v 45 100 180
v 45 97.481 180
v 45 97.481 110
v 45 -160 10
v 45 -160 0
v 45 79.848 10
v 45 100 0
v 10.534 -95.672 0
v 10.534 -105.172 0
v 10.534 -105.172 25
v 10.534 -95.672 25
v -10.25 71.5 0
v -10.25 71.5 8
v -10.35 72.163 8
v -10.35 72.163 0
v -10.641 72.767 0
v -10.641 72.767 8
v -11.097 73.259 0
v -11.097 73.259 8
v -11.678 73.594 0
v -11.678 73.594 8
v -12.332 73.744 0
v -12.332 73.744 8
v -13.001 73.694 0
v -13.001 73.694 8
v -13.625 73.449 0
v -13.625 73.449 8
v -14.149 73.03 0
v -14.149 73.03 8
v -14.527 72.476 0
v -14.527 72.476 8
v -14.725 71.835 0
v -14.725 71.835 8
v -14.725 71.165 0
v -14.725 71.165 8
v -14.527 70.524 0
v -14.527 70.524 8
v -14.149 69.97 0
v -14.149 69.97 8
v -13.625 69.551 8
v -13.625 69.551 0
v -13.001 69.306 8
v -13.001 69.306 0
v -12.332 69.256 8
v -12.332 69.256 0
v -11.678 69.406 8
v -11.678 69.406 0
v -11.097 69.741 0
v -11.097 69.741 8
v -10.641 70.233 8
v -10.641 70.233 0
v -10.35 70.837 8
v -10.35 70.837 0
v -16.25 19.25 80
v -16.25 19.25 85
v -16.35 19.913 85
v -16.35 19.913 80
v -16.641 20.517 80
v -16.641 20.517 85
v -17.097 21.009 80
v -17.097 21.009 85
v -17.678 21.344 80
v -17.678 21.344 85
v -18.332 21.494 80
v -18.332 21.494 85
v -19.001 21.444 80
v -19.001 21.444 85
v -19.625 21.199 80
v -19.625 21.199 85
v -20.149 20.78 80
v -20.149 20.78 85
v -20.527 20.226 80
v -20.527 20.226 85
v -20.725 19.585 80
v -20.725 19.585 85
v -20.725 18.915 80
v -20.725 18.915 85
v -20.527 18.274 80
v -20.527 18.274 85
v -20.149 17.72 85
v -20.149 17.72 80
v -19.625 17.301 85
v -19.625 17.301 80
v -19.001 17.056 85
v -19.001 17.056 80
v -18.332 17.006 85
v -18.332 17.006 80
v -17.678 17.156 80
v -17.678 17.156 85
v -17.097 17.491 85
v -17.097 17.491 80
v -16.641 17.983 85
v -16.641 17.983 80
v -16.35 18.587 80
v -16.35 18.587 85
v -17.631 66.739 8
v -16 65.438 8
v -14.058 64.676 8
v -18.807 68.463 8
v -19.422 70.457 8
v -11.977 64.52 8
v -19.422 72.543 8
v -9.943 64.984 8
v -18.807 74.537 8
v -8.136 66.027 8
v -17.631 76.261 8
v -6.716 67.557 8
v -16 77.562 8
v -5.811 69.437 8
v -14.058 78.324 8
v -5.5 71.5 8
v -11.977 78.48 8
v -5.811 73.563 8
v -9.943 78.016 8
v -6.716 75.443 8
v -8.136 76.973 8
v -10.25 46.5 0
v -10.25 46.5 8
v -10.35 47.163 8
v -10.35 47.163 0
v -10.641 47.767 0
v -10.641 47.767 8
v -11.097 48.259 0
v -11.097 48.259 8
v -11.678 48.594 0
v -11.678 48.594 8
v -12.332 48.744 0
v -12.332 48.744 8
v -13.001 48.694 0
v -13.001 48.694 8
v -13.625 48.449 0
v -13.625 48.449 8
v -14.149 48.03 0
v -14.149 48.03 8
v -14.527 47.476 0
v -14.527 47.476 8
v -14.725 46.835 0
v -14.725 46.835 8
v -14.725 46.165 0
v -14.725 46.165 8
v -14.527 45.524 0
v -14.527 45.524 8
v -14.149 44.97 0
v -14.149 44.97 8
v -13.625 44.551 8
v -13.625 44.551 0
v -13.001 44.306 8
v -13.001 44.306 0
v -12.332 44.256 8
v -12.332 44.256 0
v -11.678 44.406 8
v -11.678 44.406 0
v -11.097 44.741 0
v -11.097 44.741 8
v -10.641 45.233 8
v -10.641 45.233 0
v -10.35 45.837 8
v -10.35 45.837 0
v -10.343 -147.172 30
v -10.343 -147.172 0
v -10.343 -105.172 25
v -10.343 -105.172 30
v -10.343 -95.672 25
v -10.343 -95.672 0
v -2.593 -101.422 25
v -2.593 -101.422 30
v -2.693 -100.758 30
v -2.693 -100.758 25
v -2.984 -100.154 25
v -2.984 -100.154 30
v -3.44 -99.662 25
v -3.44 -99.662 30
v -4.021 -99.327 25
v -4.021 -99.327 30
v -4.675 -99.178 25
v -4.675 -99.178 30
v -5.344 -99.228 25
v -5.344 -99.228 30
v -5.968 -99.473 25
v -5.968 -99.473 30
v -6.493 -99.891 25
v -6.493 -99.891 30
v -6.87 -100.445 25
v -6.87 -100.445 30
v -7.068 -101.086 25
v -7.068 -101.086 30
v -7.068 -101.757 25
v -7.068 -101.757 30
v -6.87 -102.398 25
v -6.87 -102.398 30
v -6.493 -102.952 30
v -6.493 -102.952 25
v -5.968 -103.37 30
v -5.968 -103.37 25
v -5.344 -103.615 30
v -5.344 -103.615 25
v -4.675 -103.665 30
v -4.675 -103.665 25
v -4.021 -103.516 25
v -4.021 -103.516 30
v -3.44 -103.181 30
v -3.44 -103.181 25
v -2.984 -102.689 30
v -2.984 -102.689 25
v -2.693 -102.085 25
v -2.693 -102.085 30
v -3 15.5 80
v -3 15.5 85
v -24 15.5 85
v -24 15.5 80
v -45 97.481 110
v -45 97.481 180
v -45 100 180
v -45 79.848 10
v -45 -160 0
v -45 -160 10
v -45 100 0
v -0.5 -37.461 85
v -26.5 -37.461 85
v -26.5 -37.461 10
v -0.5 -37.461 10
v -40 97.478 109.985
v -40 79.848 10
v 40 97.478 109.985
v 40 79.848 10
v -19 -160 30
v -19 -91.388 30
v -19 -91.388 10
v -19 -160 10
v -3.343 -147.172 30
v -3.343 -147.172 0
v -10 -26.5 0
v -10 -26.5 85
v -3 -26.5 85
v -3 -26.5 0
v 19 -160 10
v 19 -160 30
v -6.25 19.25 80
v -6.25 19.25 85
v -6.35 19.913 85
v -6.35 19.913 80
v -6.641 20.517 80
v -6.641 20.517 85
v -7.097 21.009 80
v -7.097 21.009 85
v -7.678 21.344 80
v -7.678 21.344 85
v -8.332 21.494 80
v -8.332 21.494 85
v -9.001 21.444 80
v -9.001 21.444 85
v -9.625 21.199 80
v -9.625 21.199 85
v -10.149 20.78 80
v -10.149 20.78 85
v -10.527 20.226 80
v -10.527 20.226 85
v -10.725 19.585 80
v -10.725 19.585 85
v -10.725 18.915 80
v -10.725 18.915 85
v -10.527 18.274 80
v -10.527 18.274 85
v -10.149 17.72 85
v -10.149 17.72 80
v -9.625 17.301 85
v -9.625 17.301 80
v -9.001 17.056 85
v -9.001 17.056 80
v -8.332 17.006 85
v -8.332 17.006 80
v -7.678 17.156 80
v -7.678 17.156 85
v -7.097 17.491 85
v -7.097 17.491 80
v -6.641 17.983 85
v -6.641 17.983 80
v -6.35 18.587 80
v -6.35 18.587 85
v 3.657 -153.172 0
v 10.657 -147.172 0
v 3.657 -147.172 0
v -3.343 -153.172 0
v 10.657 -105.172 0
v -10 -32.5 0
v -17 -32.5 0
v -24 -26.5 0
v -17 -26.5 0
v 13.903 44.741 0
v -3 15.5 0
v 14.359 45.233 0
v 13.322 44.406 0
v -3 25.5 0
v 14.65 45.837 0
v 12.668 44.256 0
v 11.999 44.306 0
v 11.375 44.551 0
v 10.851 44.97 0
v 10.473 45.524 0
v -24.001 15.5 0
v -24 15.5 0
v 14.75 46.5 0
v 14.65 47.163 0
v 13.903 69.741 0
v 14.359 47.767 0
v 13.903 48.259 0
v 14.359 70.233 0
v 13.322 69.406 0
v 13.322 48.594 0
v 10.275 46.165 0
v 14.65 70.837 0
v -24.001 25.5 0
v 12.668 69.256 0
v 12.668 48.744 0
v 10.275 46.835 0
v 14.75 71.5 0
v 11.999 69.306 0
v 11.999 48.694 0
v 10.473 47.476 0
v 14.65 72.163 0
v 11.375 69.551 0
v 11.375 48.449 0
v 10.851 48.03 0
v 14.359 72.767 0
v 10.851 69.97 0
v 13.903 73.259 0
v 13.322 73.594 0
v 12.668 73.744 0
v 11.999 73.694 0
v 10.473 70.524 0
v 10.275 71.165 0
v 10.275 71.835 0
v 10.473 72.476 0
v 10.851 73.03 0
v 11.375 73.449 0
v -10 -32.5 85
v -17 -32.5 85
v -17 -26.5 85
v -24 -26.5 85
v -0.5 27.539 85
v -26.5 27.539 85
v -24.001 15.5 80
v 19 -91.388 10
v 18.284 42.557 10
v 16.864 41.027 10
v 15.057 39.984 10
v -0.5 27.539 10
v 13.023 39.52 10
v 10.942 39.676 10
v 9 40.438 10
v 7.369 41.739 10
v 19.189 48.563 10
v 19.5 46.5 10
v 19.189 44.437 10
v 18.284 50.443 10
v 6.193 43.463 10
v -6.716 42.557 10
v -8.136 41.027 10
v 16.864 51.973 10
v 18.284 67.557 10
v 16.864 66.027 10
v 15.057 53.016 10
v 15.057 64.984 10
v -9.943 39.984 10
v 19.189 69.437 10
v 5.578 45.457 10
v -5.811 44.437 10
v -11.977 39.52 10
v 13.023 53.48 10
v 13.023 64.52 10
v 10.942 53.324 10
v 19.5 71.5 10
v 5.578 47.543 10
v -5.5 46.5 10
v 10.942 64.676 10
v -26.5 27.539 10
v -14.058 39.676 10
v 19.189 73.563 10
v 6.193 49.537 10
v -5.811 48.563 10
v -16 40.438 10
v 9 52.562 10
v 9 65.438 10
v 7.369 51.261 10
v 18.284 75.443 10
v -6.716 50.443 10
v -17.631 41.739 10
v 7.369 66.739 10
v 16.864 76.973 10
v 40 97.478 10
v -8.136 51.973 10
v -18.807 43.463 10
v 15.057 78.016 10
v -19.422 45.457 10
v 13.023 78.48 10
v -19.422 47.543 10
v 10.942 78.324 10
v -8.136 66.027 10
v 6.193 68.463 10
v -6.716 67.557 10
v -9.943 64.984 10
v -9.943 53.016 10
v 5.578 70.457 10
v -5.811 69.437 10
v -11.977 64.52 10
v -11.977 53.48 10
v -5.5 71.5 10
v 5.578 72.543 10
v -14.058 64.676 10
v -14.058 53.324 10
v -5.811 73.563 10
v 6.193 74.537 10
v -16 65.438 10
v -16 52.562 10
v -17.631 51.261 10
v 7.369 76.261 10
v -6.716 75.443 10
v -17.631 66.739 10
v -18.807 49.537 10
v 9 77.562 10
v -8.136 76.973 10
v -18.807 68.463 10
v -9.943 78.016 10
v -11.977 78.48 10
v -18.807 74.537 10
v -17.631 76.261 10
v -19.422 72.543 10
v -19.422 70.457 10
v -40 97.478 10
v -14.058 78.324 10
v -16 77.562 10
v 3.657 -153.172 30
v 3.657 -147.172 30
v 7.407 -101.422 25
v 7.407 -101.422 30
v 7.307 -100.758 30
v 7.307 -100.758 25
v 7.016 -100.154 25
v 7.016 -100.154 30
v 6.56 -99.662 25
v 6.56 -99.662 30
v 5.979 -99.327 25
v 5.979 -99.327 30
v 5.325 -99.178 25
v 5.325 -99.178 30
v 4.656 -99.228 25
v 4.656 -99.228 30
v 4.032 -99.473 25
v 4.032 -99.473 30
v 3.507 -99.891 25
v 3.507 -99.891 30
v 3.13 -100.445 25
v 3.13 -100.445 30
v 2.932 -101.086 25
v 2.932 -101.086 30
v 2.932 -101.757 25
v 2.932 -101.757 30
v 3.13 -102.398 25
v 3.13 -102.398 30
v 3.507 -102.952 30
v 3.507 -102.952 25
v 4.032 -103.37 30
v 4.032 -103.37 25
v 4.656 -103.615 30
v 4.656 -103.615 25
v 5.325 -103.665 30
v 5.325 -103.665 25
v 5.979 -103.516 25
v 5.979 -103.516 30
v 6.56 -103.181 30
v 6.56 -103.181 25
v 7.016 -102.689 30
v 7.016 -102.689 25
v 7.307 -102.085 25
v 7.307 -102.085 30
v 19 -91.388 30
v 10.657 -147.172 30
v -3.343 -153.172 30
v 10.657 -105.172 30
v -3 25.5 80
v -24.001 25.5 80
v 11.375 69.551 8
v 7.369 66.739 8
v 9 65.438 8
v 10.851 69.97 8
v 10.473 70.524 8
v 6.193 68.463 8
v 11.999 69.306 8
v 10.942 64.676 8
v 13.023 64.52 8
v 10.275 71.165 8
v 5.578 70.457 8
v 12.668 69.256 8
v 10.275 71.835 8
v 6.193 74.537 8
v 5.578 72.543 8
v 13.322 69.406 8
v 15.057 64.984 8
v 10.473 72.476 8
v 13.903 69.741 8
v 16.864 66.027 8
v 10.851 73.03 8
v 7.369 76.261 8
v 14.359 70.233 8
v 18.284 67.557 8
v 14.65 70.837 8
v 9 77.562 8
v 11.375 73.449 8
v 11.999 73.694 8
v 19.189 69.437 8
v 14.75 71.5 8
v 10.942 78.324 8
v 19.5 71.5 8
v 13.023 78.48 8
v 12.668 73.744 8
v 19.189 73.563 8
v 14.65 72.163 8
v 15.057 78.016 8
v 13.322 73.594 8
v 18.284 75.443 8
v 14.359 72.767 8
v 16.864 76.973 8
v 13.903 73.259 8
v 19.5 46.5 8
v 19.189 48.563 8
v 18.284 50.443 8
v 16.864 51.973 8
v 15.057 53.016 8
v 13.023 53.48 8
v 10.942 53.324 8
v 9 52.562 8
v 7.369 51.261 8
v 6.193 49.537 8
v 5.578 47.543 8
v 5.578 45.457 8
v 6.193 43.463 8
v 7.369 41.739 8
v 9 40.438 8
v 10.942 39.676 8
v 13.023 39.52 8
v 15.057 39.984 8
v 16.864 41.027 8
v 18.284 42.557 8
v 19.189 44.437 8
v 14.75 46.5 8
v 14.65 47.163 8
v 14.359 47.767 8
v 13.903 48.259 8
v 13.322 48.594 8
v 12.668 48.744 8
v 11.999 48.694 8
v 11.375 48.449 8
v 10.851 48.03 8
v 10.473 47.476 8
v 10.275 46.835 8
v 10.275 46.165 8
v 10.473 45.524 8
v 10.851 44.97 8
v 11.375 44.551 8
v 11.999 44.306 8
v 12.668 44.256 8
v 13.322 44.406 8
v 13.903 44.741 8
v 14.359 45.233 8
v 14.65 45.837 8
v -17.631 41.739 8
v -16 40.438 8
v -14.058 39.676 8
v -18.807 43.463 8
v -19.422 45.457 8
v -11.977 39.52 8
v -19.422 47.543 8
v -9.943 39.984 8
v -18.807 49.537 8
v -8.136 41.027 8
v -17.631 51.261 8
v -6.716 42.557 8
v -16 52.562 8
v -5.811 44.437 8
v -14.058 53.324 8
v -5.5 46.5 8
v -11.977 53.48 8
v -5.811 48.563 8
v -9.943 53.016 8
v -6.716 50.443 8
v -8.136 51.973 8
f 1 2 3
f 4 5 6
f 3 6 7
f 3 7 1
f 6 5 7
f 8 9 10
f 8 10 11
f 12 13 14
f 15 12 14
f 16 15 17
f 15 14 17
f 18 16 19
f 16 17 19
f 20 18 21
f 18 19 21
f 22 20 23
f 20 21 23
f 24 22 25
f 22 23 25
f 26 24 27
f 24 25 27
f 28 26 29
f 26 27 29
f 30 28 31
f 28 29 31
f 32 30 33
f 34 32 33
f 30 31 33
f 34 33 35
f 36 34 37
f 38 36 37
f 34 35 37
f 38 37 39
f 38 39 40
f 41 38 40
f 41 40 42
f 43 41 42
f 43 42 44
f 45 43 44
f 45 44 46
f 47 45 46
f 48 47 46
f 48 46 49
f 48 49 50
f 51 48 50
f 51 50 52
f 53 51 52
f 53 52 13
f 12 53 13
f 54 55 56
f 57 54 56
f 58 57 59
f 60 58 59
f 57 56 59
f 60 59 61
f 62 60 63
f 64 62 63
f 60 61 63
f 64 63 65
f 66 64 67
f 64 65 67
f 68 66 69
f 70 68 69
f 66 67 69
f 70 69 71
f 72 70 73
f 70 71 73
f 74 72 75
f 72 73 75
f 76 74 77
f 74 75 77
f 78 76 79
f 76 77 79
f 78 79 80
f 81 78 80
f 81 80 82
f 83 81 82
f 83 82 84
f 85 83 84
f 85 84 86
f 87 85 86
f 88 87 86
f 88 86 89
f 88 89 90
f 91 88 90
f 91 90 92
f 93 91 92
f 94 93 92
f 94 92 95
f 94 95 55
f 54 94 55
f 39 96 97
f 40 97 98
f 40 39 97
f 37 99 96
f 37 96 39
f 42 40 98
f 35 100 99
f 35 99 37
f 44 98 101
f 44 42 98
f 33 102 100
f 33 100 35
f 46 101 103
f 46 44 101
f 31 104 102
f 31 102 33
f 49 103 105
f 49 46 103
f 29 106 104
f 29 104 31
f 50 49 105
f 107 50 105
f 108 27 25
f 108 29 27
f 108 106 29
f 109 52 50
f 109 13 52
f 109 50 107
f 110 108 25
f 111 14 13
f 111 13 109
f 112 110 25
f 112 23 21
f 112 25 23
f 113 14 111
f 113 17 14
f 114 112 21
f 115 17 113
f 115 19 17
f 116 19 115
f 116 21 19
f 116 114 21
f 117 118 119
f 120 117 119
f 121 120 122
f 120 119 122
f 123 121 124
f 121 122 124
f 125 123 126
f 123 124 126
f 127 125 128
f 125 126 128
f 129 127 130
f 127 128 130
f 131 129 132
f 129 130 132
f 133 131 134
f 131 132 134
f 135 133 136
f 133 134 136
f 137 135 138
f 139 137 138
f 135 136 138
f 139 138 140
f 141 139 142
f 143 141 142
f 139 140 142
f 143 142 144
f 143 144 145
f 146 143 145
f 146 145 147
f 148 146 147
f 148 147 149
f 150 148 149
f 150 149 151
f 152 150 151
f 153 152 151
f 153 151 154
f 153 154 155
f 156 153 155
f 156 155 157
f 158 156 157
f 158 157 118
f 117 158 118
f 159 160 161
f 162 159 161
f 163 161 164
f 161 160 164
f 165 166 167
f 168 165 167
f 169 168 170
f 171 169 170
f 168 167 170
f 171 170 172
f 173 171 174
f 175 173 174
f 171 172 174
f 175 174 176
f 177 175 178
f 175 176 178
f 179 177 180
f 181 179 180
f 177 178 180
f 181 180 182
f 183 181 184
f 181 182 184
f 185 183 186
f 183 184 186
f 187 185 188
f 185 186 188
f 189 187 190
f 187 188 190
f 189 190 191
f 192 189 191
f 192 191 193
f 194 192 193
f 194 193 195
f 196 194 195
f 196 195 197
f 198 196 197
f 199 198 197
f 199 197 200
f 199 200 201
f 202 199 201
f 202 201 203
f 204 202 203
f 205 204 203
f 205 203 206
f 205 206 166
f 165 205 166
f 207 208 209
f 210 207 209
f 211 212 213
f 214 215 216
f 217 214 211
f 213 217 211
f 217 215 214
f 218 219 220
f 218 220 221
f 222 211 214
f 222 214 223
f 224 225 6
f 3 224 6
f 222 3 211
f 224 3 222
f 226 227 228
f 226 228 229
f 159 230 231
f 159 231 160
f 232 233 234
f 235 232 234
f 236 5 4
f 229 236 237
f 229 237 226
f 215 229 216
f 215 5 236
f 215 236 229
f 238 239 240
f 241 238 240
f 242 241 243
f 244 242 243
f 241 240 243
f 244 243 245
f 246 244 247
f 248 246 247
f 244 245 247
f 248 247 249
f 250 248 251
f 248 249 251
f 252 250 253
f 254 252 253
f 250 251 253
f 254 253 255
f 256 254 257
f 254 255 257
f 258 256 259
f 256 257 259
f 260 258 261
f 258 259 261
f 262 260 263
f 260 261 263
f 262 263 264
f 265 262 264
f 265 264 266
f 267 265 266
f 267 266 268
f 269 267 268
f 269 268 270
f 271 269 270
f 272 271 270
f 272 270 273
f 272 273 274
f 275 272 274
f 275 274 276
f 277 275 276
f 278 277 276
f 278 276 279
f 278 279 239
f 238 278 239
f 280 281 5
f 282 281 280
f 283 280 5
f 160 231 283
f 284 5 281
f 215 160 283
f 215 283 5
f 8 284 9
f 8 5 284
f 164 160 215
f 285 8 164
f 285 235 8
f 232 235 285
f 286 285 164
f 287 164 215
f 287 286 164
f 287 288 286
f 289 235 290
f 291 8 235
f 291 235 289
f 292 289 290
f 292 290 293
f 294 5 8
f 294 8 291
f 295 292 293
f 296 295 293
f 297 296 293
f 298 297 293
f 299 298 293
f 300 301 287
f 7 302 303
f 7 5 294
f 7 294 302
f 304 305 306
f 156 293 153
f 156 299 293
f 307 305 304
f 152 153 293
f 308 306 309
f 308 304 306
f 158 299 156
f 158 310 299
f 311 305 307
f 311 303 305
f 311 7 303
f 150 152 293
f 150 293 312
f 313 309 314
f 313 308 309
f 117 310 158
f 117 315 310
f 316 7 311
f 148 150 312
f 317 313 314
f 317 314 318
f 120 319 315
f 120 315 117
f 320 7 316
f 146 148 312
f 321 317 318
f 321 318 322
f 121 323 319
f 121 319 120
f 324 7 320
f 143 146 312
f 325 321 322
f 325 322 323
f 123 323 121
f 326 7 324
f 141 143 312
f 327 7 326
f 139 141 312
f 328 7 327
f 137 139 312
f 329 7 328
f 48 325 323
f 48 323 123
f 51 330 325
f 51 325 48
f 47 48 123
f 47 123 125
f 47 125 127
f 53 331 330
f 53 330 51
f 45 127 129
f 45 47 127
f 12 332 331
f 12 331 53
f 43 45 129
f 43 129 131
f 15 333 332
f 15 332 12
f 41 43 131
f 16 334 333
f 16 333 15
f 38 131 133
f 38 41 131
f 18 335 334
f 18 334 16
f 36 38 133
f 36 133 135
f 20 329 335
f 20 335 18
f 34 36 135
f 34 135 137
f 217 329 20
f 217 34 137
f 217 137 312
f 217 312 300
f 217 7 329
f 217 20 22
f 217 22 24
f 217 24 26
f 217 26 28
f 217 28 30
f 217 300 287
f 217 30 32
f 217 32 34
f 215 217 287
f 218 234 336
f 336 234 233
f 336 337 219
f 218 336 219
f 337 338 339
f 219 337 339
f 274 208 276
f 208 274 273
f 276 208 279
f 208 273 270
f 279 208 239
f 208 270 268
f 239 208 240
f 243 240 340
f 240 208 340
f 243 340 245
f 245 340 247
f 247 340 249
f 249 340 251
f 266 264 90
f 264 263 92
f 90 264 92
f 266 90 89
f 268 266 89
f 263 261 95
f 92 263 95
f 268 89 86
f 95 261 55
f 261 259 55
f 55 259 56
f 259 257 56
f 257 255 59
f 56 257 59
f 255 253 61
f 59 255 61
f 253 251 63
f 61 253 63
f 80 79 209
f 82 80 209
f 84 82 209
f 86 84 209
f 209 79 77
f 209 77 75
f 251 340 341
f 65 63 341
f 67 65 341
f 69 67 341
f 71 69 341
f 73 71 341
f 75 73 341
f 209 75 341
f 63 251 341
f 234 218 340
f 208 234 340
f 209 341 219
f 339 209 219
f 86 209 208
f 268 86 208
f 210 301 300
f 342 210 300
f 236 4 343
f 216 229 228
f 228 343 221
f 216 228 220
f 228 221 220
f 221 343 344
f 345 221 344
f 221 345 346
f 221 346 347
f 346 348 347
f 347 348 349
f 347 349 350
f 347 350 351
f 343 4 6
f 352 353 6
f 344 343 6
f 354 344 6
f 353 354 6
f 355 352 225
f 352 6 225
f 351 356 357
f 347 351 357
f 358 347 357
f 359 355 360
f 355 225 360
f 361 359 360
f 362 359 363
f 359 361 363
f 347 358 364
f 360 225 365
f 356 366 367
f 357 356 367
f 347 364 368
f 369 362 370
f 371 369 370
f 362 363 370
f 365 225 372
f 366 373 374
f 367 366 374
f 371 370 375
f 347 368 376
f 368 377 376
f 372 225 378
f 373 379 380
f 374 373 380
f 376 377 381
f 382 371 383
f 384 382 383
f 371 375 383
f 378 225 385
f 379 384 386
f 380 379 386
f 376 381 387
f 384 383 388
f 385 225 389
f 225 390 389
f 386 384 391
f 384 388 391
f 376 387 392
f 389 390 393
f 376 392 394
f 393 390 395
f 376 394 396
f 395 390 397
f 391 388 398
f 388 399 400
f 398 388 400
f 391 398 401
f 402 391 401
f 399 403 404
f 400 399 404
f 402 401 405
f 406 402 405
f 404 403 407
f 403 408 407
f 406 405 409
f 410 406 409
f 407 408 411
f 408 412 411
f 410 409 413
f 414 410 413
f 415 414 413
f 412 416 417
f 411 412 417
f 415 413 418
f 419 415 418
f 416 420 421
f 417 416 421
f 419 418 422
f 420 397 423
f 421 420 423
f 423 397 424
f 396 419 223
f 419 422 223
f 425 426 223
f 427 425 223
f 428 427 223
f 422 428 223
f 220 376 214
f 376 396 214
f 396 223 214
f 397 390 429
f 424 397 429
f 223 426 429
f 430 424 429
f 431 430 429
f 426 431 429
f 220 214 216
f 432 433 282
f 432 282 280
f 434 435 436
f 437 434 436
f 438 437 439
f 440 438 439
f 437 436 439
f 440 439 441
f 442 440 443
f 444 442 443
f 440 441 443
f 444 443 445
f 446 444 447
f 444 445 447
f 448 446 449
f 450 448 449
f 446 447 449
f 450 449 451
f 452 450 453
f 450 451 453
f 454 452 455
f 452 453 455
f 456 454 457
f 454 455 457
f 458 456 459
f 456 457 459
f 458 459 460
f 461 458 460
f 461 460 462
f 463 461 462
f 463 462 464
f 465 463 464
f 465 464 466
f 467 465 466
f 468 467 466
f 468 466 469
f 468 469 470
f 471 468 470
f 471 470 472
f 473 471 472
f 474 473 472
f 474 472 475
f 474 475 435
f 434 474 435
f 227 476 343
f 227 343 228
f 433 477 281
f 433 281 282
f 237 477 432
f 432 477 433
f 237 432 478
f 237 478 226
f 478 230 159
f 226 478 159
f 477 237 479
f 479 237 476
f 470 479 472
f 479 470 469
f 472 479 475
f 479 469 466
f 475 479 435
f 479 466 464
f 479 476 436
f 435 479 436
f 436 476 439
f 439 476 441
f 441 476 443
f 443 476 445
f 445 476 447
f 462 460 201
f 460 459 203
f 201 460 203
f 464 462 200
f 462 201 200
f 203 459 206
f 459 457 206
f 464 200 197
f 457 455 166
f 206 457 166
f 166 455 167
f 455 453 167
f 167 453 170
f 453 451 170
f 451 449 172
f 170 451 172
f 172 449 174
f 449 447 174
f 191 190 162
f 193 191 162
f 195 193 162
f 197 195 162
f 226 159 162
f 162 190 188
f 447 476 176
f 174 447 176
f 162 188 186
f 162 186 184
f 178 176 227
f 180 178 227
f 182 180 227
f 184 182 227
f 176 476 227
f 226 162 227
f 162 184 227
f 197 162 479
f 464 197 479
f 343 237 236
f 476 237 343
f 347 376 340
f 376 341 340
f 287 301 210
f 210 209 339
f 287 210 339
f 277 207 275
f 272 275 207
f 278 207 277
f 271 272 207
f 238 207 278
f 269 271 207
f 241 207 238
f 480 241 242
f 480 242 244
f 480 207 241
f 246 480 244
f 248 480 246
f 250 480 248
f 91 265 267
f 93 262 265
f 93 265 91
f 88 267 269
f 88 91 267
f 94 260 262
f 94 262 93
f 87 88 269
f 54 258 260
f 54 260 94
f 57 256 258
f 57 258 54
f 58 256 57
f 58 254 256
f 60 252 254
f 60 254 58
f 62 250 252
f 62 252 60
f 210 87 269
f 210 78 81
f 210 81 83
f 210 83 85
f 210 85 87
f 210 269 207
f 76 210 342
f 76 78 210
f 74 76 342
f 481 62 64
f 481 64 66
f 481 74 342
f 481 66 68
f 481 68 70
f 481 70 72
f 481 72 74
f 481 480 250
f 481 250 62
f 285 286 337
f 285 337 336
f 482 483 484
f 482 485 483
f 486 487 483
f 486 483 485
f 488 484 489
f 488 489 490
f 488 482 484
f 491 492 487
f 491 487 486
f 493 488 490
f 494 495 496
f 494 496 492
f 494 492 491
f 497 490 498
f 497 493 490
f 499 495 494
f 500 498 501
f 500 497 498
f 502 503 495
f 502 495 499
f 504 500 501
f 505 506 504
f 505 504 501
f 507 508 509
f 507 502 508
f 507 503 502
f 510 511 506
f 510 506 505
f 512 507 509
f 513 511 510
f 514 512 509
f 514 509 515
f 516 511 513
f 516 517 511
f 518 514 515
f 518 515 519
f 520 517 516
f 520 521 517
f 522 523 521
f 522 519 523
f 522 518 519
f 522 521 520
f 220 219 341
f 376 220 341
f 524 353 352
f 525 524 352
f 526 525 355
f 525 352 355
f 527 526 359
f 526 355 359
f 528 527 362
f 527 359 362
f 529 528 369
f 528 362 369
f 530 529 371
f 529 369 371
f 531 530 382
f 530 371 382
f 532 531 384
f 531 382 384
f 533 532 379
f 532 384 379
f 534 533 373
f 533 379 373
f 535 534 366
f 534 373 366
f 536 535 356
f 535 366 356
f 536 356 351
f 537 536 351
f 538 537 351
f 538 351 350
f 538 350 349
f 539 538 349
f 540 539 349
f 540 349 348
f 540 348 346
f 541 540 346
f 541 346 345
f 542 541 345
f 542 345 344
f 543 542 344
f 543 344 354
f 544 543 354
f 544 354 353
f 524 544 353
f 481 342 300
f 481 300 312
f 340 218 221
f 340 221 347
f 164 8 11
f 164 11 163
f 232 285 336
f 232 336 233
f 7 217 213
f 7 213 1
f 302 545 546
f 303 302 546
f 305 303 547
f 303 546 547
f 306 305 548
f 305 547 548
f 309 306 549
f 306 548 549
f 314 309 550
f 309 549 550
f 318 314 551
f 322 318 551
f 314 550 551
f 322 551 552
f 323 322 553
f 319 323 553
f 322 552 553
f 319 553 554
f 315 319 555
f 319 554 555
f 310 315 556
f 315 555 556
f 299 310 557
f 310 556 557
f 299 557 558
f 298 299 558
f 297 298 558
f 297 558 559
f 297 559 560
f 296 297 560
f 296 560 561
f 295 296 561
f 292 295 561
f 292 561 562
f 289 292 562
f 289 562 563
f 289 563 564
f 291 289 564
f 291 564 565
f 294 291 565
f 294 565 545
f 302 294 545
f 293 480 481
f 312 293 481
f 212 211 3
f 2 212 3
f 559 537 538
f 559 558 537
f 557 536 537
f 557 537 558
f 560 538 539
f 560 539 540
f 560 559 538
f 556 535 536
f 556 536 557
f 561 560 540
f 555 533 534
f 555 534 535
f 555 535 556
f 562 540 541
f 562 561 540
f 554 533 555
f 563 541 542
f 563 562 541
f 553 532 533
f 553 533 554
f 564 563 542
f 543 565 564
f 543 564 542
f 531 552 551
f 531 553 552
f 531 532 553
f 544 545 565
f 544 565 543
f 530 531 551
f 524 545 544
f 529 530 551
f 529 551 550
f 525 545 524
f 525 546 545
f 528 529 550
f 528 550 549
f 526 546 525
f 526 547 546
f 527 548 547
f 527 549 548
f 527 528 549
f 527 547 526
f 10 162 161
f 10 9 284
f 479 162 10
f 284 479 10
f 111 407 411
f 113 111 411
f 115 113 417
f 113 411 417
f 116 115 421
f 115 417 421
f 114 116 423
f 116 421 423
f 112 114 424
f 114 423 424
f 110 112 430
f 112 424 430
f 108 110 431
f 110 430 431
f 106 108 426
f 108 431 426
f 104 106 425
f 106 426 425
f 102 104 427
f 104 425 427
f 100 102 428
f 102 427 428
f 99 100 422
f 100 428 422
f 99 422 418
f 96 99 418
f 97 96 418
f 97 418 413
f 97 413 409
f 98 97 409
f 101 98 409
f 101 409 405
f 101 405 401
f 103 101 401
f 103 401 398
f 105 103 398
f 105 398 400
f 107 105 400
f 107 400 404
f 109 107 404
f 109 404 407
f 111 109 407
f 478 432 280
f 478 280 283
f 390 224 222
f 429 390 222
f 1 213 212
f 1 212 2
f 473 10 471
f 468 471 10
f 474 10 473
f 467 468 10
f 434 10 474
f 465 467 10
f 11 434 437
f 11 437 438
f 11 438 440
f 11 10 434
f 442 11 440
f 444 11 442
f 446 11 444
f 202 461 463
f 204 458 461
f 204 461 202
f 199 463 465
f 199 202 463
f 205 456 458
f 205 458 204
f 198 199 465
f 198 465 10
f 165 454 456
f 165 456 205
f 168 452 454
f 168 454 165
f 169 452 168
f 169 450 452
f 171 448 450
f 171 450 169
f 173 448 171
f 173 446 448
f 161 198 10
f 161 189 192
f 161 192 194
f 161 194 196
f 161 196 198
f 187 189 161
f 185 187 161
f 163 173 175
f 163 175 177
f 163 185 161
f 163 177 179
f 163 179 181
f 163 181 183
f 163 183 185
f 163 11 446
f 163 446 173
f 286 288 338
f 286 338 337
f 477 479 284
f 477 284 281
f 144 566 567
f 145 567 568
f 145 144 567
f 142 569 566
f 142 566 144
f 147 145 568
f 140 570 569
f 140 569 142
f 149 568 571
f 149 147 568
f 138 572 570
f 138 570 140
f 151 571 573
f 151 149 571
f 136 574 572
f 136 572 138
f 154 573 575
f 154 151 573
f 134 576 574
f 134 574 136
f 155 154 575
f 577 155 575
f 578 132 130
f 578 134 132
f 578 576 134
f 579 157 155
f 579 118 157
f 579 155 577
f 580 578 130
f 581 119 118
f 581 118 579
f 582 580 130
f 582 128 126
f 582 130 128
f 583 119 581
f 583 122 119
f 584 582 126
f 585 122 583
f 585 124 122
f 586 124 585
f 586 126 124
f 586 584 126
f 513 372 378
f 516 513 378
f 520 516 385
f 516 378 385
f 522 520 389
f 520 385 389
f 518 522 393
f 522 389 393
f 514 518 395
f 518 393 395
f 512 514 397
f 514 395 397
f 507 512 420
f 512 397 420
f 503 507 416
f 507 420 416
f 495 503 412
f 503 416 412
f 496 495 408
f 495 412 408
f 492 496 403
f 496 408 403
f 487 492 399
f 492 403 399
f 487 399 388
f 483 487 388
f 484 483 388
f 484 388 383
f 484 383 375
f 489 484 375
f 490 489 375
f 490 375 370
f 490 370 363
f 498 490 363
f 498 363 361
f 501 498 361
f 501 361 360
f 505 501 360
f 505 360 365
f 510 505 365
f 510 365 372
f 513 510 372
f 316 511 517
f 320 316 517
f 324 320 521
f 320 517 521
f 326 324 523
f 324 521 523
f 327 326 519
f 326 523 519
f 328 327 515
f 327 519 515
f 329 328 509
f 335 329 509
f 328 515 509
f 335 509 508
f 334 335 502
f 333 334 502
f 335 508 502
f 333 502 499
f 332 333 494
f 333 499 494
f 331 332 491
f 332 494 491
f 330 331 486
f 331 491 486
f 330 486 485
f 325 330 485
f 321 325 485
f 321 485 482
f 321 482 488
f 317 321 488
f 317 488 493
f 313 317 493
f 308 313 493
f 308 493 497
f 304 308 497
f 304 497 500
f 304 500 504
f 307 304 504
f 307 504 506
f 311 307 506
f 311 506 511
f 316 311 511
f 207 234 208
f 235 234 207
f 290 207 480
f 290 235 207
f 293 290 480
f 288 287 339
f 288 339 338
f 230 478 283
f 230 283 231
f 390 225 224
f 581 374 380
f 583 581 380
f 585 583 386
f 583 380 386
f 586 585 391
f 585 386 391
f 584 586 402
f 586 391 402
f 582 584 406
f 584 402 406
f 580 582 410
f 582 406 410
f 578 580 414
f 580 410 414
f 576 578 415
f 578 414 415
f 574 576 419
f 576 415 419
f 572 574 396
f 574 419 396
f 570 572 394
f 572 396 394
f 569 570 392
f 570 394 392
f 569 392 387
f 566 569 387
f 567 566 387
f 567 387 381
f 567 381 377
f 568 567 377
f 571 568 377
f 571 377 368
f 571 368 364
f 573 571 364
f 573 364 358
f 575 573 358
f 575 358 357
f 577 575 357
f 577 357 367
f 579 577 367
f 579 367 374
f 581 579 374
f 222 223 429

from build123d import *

# Parameters (mm, degrees)
SKETCH1_W           = 150
SKETCH1_H           = 200
BOSS_EXTRUDE1_DEPTH = 30
SKETCH2_W           = 150
SKETCH2_H           = 10
BOSS_EXTRUDE2_DEPTH = 150
SKETCH3_R           = 1.65
SKETCH3_R_2         = 2.25
CUT_EXTRUDE3_DEPTH  = 80
SKETCH6_R           = 5
CUT_EXTRUDE5_DEPTH  = 22
SKETCH7_R           = 1.925
CUT_EXTRUDE6_DEPTH  = 5
FILLET1_R           = 5
SKETCH9_R           = 2.08
CUT_EXTRUDE7_DEPTH  = 30
SKETCH12_W          = 26
SKETCH12_H          = 65
SKETCH12_R          = 2.08
BOSS_EXTRUDE5_DEPTH = 85
SKETCH13_W          = 150
SKETCH13_H          = 60
BOSS_EXTRUDE6_DEPTH = 30
SKETCH15_R          = 2.08
CUT_EXTRUDE8_DEPTH  = 30
SKETCH16_R          = 7
CUT_EXTRUDE9_DEPTH  = 22
SKETCH17_W          = 20
SKETCH17_H          = 260
CUT_EXTRUDE10_DEPTH = 180
SKETCH19_W          = 26
SKETCH19_H          = 65
CUT_EXTRUDE11_DEPTH = 20
SKETCH20_W          = 110
SKETCH20_H          = 12.480627484
CUT_EXTRUDE12_DEPTH = 200
SKETCH21_W          = 10
SKETCH21_H          = 260
CUT_EXTRUDE13_DEPTH = 200
SKETCH22_W          = 21.000744215
SKETCH22_H          = 10
CUT_EXTRUDE14_DEPTH = 80
SKETCH24_W          = 20.877179784
SKETCH24_H          = 9.5
CUT_EXTRUDE15_DEPTH = 25
SKETCH25_R          = 2.25
CUT_EXTRUDE16_DEPTH = 10
SKETCH26_R          = 2.25
CUT_EXTRUDE17_DEPTH = 10
SKETCH27_R          = 2.25
CUT_EXTRUDE18_DEPTH = 10
SKETCH28_R          = 2.25
CUT_EXTRUDE19_DEPTH = 10
SKETCH29_R          = 2.25
CUT_EXTRUDE20_DEPTH = 10
CHAMFER2_SIZE       = 100
CHAMFER2_SIZE2      = 17.632698071
SKETCH33_W          = 40
SKETCH33_H          = 17.63
CUT_EXTRUDE21_DEPTH = 170


with BuildPart() as part:
    # Sketch1 → Boss-Extrude1 (new body)
    with BuildSketch(Plane.XY):
        Rectangle(SKETCH1_W, SKETCH1_H)
    extrude(amount=BOSS_EXTRUDE1_DEPTH)

    # Sketch2 → Boss-Extrude2 (add)
    with BuildSketch(Plane.XY.offset(30)):
        with Locations((0, 95)):
            Rectangle(SKETCH2_W, SKETCH2_H)
    extrude(amount=BOSS_EXTRUDE2_DEPTH)

    # Sketch3 → Cut-Extrude3 (cut)
    with BuildSketch(Plane.XY.offset(30)):
        with Locations((12.5, 46.5)):
            Circle(SKETCH3_R)
        with Locations((-12.5, 46.5)):
            Circle(SKETCH3_R_2)
        with Locations((12.5, 71.5)):
            Circle(SKETCH3_R)
        with Locations((-12.5, 71.5)):
            Circle(SKETCH3_R_2)
    extrude(amount=-CUT_EXTRUDE3_DEPTH, mode=Mode.SUBTRACT)

    # Sketch6 → Cut-Extrude5 (cut)
    with BuildSketch(Plane.XY.offset(30)):
        with Locations((-12.5, 71.5)):
            Circle(SKETCH6_R)
        with Locations((12.5, 71.5)):
            Circle(SKETCH6_R)
        with Locations((-12.5, 46.5)):
            Circle(SKETCH6_R)
        with Locations((12.5, 46.5)):
            Circle(SKETCH6_R)
    extrude(amount=-CUT_EXTRUDE5_DEPTH, mode=Mode.SUBTRACT)

    # Sketch7 → Cut-Extrude6 (cut)
    with BuildSketch(Plane.XY.offset(8)):
        with Locations((-12.5, 71.5)):
            Circle(SKETCH7_R)
        with Locations((12.5, 71.5)):
            Circle(SKETCH7_R)
        with Locations((-12.5, 46.5)):
            Circle(SKETCH7_R)
        with Locations((12.5, 46.5)):
            Circle(SKETCH7_R)
    extrude(amount=-CUT_EXTRUDE6_DEPTH, mode=Mode.SUBTRACT)

    # Fillet1
    fillet1_edges = [part.edges().sort_by_distance(p)[0] for p in [
        (0, 90, 30),
    ]]
    fillet(fillet1_edges, radius=FILLET1_R)

    # Sketch9 → Cut-Extrude7 (cut)
    with BuildSketch(Plane.XY.offset(30)):
        Polygon((-10, -26.5), (-3, -26.5), (-3, 15.5), (-24, 15.5), (-24, -26.5), (-17, -26.5), (-17, -32.5), (-10, -32.5), align=None)
        with Locations((-18.5, 19.25)):
            Circle(SKETCH9_R)
        with Locations((-8.5, 19.25)):
            Circle(SKETCH9_R)
    extrude(amount=-CUT_EXTRUDE7_DEPTH, mode=Mode.SUBTRACT)

    # Sketch12 → Boss-Extrude5 (add)
    with BuildSketch(Plane(origin=(0, 0, 0), x_dir=(-1, 0, 0), z_dir=(0, 0, -1))):
        with Locations((13.5, -4.961410483)):
            Rectangle(SKETCH12_W, SKETCH12_H)
        with Locations((8.5, 19.25)):
            Circle(SKETCH12_R, mode=Mode.SUBTRACT)
        with Locations((18.5, 19.25)):
            Circle(SKETCH12_R, mode=Mode.SUBTRACT)
        Polygon((3, 15.5), (3, -26.5), (10, -26.5), (10, -32.5), (17, -32.5), (17, -26.5), (24, -26.5), (24, 15.5), align=None, mode=Mode.SUBTRACT)
    extrude(amount=-BOSS_EXTRUDE5_DEPTH)

    # Sketch13 → Boss-Extrude6 (add)
    with BuildSketch(Plane(origin=(0, 0, 0), x_dir=(-1, 0, 0), z_dir=(0, 0, -1))):
        with Locations((0, -130)):
            Rectangle(SKETCH13_W, SKETCH13_H)
    extrude(amount=-BOSS_EXTRUDE6_DEPTH)

    # Sketch15 → Cut-Extrude8 (cut)
    with BuildSketch(Plane.XY.offset(30)):
        with Locations((-4.843183012, -101.421536398)):
            Circle(SKETCH15_R)
        with Locations((5.156816988, -101.421536398)):
            Circle(SKETCH15_R)
        Polygon((-10.343183012, -105.171536398), (10.656816988, -105.171536398), (10.656816988, -147.171536398), (3.656816988, -147.171536398), (3.656816988, -153.171536398), (-3.343183012, -153.171536398), (-3.343183012, -147.171536398), (-10.343183012, -147.171536398), align=None)
    extrude(amount=-CUT_EXTRUDE8_DEPTH, mode=Mode.SUBTRACT)

    # Sketch16 → Cut-Extrude9 (cut)
    with BuildSketch(Plane.XY.offset(30)):
        with Locations((-12.5, 71.5)):
            Circle(SKETCH16_R)
        with Locations((12.5, 71.5)):
            Circle(SKETCH16_R)
        with Locations((12.5, 46.5)):
            Circle(SKETCH16_R)
        with Locations((-12.5, 46.5)):
            Circle(SKETCH16_R)
    extrude(amount=-CUT_EXTRUDE9_DEPTH, mode=Mode.SUBTRACT)

    # Sketch17 → Cut-Extrude10 (cut)
    with BuildSketch(Plane(origin=(0, 0, 0), x_dir=(-1, 0, 0), z_dir=(0, 0, -1))):
        with Locations((65, -30)):
            Rectangle(SKETCH17_W, SKETCH17_H)
        with Locations((-65, -30)):
            Rectangle(SKETCH17_W, SKETCH17_H)
    extrude(amount=-CUT_EXTRUDE10_DEPTH, mode=Mode.SUBTRACT)

    # Sketch19 → Cut-Extrude11 (cut)
    with BuildSketch(Plane.XY.offset(30)):
        Polygon((-55, 85), (55, 85), (55, -160), (19, -160), (19, -91.388207499), (-19, -91.388207499), (-19, -160), (-55, -160), align=None)
        with Locations((-13.5, -4.961410483)):
            Rectangle(SKETCH19_W, SKETCH19_H, mode=Mode.SUBTRACT)
    extrude(amount=-CUT_EXTRUDE11_DEPTH, mode=Mode.SUBTRACT)

    # Sketch20 → Cut-Extrude12 (cut)
    with BuildSketch(Plane.XY.offset(10)):
        with Locations((0, 91.240313742)):
            Rectangle(SKETCH20_W, SKETCH20_H)
    extrude(amount=CUT_EXTRUDE12_DEPTH, mode=Mode.SUBTRACT)

    # Sketch21 → Cut-Extrude13 (cut)
    with BuildSketch(Plane(origin=(0, 0, 0), x_dir=(-1, 0, 0), z_dir=(0, 0, -1))):
        with Locations((50, -30)):
            Rectangle(SKETCH21_W, SKETCH21_H)
        with Locations((-50, -30)):
            Rectangle(SKETCH21_W, SKETCH21_H)
    extrude(amount=-CUT_EXTRUDE13_DEPTH, mode=Mode.SUBTRACT)

    # Sketch22 → Cut-Extrude14 (cut)
    with BuildSketch(Plane(origin=(0, 0, 0), x_dir=(-1, 0, 0), z_dir=(0, 0, -1))):
        with Locations((13.500372108, 20.5)):
            Rectangle(SKETCH22_W, SKETCH22_H)
    extrude(amount=-CUT_EXTRUDE14_DEPTH, mode=Mode.SUBTRACT)

    # Sketch24 → Cut-Extrude15 (cut)
    with BuildSketch(Plane(origin=(0, 0, 0), x_dir=(-1, 0, 0), z_dir=(0, 0, -1))):
        with Locations((-0.09540688, -100.421536398)):
            Rectangle(SKETCH24_W, SKETCH24_H)
    extrude(amount=-CUT_EXTRUDE15_DEPTH, mode=Mode.SUBTRACT)

    # Sketch25 → Cut-Extrude16 (cut)
    with BuildSketch(Plane.XY.offset(8)):
        with Locations((12.5, 71.5)):
            Circle(SKETCH25_R)
    extrude(amount=-CUT_EXTRUDE16_DEPTH, mode=Mode.SUBTRACT)

    # Sketch26 → Cut-Extrude17 (cut)
    with BuildSketch(Plane.XY.offset(8)):
        with Locations((12.5, 46.5)):
            Circle(SKETCH26_R)
    extrude(amount=-CUT_EXTRUDE17_DEPTH, mode=Mode.SUBTRACT)

    # Sketch27 → Cut-Extrude18 (cut)
    with BuildSketch(Plane.XY.offset(85)):
        with Locations((-18.5, 19.25)):
            Circle(SKETCH27_R)
    extrude(amount=-CUT_EXTRUDE18_DEPTH, mode=Mode.SUBTRACT)

    # Sketch28 → Cut-Extrude19 (cut)
    with BuildSketch(Plane.XY.offset(85)):
        with Locations((-8.5, 19.25)):
            Circle(SKETCH28_R)
    extrude(amount=-CUT_EXTRUDE19_DEPTH, mode=Mode.SUBTRACT)

    # Sketch29 → Cut-Extrude20 (cut)
    with BuildSketch(Plane.XY.offset(30)):
        with Locations((-4.843183012, -101.421536398)):
            Circle(SKETCH29_R)
        with Locations((5.156816988, -101.421536398)):
            Circle(SKETCH29_R)
    extrude(amount=-CUT_EXTRUDE20_DEPTH, mode=Mode.SUBTRACT)

    # Chamfer2
    chamfer2_edges = [part.edges().sort_by_distance(p)[0] for p in [
        (0, 97.480627484, 10),
    ]]
    chamfer2_side = [part.faces().sort_by_distance(p)[0] for p in [
        (0, 97.480627484, 95),
    ]]
    chamfer(chamfer2_edges, length=CHAMFER2_SIZE, length2=CHAMFER2_SIZE2, reference=chamfer2_side[0])

    # Sketch33 → Cut-Extrude21 (cut)
    with BuildSketch(Plane.XY.offset(10)):
        with Locations((-20, 88.662929413)):
            Rectangle(SKETCH33_W, SKETCH33_H)
        with Locations((20, 88.662929413)):
            Rectangle(SKETCH33_W, SKETCH33_H)
    extrude(amount=CUT_EXTRUDE21_DEPTH, mode=Mode.SUBTRACT)


solid = part.part
